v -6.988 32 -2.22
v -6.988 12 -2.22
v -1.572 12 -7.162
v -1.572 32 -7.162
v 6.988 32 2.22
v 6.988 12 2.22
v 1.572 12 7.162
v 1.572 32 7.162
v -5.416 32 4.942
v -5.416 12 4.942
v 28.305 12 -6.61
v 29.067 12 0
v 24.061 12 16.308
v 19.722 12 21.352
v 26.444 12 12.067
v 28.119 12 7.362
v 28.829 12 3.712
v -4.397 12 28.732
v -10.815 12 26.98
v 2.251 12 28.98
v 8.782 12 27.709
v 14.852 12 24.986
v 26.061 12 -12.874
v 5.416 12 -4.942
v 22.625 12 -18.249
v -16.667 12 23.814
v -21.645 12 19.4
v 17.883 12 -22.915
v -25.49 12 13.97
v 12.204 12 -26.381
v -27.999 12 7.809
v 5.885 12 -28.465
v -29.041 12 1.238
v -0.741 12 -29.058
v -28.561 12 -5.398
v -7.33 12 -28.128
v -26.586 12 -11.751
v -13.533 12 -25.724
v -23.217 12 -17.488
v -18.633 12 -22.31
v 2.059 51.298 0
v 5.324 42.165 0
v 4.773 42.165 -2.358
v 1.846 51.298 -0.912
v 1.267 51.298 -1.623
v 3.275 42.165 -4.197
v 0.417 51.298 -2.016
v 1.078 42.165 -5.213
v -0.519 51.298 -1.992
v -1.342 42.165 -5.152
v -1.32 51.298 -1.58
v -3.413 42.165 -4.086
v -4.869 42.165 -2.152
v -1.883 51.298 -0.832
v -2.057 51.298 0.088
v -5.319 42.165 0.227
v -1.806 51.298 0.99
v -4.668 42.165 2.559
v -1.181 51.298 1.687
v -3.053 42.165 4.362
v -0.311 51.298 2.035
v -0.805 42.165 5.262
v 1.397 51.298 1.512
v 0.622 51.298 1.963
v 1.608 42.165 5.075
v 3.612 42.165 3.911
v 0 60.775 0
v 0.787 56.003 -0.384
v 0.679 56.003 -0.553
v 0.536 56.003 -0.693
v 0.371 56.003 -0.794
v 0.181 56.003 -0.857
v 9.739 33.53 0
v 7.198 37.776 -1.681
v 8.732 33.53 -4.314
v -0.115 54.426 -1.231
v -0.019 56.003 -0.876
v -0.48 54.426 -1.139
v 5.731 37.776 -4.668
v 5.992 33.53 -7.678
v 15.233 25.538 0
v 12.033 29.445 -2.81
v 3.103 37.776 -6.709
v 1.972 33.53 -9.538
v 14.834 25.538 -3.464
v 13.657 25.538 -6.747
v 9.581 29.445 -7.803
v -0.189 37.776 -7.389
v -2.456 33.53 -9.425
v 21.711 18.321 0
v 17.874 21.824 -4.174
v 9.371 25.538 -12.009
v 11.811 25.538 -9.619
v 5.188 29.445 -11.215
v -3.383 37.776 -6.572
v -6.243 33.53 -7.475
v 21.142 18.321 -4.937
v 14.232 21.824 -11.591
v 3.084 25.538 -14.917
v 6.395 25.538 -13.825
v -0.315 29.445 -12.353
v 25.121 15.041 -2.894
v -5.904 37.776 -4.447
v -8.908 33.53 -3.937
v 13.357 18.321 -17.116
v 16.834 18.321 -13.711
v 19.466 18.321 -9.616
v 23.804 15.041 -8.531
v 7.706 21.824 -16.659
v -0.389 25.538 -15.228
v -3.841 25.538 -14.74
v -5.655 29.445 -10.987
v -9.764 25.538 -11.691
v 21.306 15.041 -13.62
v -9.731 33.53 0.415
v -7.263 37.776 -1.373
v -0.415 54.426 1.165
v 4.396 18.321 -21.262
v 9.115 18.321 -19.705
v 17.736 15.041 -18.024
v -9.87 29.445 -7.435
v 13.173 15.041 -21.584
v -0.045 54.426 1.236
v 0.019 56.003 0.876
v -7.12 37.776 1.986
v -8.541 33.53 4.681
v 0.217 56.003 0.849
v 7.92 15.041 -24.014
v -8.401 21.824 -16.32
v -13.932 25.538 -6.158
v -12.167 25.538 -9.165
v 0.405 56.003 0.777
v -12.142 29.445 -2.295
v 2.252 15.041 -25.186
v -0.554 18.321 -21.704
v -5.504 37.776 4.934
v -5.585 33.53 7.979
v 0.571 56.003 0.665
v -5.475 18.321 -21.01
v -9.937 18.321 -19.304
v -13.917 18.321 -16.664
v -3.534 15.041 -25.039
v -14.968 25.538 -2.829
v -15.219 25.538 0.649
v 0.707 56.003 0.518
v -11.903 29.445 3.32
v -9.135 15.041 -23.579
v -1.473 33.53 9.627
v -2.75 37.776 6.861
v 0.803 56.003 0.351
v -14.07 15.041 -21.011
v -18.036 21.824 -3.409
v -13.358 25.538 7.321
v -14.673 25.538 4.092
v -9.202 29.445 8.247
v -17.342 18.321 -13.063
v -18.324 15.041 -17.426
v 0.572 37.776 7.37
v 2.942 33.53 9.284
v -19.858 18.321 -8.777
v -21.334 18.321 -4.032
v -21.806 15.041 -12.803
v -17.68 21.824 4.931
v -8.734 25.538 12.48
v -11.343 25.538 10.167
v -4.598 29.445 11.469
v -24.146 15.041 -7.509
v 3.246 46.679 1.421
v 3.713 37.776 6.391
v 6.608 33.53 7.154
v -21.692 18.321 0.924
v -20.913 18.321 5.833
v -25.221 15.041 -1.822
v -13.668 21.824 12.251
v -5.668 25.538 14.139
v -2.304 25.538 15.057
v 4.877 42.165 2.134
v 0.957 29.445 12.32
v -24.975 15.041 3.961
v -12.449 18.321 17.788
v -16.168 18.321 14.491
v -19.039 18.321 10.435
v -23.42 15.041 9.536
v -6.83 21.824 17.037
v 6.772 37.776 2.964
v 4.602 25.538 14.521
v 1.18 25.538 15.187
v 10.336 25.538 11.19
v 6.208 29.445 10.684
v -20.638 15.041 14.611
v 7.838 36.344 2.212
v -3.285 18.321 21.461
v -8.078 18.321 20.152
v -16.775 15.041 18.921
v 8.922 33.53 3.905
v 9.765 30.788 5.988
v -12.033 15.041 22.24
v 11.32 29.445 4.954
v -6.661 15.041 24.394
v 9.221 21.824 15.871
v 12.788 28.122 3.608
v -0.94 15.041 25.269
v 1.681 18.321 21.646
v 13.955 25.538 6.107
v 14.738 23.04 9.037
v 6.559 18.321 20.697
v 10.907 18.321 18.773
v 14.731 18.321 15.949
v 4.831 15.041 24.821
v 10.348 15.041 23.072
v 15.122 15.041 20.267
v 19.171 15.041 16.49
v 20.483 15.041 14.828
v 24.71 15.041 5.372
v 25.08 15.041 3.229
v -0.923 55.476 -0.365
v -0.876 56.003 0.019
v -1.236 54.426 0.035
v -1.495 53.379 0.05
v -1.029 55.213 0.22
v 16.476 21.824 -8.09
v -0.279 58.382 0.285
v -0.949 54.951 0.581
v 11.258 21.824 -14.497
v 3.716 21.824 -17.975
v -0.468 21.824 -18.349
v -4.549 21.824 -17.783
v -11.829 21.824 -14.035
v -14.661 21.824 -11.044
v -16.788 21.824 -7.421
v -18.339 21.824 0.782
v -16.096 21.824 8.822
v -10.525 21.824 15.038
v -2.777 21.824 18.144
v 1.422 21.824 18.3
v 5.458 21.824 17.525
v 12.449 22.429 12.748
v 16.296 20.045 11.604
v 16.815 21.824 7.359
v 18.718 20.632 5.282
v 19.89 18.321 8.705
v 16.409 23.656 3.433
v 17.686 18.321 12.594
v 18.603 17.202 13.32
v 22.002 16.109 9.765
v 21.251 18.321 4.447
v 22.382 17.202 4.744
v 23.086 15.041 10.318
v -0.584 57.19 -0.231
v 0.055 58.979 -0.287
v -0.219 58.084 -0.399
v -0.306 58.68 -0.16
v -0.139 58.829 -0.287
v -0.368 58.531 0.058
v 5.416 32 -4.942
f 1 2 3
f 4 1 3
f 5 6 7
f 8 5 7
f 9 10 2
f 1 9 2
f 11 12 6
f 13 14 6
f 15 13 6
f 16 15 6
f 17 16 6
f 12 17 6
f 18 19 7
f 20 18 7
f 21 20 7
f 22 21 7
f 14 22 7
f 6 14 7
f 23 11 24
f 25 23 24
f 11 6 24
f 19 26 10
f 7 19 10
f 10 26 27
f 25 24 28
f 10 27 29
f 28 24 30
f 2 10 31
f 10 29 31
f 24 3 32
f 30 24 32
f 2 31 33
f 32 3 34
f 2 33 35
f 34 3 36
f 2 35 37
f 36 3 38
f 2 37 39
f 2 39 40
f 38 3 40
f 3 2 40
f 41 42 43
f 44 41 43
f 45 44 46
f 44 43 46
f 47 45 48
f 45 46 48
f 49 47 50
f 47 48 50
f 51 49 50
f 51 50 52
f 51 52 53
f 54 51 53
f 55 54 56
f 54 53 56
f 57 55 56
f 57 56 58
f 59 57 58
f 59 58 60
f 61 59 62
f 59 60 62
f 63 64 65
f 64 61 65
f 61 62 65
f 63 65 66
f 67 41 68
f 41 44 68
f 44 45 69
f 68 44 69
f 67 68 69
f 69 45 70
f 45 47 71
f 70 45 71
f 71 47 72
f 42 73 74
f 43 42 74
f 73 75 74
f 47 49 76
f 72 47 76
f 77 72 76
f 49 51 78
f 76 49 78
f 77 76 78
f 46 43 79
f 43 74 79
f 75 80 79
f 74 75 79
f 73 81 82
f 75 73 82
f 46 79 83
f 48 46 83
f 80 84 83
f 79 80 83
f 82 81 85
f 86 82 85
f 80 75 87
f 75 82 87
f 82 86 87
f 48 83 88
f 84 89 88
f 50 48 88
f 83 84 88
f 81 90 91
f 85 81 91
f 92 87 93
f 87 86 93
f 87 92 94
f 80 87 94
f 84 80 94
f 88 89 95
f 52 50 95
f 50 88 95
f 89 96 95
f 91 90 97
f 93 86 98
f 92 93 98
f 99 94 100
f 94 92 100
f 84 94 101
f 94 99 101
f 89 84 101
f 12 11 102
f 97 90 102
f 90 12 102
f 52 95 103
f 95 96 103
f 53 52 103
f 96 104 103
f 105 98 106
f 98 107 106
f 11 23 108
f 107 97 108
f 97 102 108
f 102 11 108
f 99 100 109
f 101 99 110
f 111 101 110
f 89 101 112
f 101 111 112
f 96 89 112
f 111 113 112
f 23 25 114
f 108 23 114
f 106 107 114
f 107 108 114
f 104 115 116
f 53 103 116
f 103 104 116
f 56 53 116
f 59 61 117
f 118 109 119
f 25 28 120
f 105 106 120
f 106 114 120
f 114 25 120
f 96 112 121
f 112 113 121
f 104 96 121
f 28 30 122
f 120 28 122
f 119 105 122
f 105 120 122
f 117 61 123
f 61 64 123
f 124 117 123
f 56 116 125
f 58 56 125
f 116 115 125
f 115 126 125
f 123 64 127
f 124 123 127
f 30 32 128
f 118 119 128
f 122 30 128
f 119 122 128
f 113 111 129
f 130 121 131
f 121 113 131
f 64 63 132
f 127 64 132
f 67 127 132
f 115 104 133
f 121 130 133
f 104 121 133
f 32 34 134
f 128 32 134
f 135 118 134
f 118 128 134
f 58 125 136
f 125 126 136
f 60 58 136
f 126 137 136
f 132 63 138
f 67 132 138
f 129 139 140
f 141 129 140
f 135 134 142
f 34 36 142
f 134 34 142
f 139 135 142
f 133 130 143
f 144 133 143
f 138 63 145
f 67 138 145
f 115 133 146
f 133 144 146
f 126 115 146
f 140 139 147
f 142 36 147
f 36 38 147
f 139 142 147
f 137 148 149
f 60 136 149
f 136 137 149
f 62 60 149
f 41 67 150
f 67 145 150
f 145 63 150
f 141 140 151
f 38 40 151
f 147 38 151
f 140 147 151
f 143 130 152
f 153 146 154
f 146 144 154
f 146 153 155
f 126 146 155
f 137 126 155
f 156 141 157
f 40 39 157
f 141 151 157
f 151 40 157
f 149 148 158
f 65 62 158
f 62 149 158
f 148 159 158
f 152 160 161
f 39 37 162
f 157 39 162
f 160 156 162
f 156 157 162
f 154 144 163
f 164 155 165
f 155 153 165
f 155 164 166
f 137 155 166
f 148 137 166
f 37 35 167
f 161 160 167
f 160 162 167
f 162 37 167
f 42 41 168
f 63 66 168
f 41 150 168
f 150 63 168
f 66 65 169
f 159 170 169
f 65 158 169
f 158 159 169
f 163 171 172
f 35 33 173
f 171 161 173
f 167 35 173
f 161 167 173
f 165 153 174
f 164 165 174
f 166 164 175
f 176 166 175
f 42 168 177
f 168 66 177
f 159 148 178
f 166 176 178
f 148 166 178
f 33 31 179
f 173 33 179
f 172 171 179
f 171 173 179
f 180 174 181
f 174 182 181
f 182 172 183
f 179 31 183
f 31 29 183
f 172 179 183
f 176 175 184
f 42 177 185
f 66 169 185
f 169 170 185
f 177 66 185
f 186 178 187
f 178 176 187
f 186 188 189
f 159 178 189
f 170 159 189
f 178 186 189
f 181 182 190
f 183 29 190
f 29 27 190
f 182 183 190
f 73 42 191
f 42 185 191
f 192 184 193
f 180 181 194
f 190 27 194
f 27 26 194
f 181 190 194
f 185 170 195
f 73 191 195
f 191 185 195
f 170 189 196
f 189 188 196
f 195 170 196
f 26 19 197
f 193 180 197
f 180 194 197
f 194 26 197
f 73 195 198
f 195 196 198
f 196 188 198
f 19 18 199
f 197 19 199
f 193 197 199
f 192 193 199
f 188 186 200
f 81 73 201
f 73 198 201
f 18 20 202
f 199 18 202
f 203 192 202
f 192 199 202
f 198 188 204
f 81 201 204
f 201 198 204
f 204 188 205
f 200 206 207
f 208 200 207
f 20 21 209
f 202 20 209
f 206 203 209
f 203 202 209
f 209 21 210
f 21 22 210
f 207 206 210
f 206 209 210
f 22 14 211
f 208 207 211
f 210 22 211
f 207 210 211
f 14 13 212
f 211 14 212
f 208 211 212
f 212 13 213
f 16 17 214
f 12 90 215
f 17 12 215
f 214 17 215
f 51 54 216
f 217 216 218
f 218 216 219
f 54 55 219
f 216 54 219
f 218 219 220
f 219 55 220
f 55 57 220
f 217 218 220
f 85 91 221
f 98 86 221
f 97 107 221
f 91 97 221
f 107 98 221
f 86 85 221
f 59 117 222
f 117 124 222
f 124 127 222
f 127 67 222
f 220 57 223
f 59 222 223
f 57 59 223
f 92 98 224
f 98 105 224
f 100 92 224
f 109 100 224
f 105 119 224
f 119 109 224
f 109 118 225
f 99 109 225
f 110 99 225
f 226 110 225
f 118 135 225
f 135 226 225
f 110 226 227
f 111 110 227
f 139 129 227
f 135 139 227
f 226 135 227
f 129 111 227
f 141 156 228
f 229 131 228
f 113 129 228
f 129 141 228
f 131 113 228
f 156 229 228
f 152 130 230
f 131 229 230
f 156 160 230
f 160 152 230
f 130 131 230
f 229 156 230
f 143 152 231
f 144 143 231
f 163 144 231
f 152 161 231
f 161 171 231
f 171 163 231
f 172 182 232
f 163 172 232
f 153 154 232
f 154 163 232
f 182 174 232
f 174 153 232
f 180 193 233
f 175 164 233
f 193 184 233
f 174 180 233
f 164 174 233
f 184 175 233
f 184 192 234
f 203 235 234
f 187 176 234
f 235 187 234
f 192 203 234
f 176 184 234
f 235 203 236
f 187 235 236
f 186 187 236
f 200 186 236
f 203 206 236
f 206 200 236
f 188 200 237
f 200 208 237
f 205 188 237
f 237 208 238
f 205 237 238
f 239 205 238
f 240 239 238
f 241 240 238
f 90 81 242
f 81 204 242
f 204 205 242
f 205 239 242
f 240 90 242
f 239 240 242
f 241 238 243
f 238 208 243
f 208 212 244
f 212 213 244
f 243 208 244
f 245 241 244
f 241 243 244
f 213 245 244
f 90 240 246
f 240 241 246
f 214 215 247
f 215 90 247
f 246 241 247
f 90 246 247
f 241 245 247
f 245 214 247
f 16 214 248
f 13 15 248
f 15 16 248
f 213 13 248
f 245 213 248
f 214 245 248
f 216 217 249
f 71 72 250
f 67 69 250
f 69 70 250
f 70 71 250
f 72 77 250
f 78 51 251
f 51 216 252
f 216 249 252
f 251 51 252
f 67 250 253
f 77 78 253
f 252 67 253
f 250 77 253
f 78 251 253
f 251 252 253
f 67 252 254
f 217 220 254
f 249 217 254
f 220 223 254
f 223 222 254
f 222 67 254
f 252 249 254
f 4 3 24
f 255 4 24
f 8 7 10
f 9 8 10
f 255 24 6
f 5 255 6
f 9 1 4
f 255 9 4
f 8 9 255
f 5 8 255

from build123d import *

# Parameters (mm, degrees)
SKETCH4_W               = 141.009584828
SKETCH4_H               = 12
CUT_EXTRUDE1_DEPTH      = 53.911904977
CUT_EXTRUDE1_DEPTH_BACK = 53.911904977
CUT_EXTRUDE2_DEPTH      = 20


with BuildPart() as part:
    # Sketch3 → Revolve2 (revolve)
    with BuildSketch(Plane.XY):
        with BuildLine():
            Line((0, 0), (0, 60.774821803))
            ThreePointArc((0, 60.774821803), (17.600685917, 22.677819891), (52.911904877, 0))
            Line((52.911904877, 0), (0, 0))
        make_face()
    revolve(axis=Axis((0, 0, 0), (0, 1, 0)))

    # Sketch4 → Cut-Extrude1 (cut, two sides)
    with BuildSketch(Plane(origin=(0, 0, 0), x_dir=(0, 0, -1), z_dir=(1, 0, 0))) as cut_extrude1_sk:
        with Locations((0, 6)):
            Rectangle(SKETCH4_W, SKETCH4_H)
    extrude(amount=CUT_EXTRUDE1_DEPTH, mode=Mode.SUBTRACT)
    extrude(cut_extrude1_sk.sketch, amount=-CUT_EXTRUDE1_DEPTH_BACK, mode=Mode.SUBTRACT)

    # Sketch5 → Cut-Extrude2 (cut)
    with BuildSketch(Plane.XZ.offset(-12)):
        Polygon((-5.41643054, 4.942227588), (-6.988309913, -2.219652652), (-1.571879373, -7.16188024), (5.41643054, -4.942227588), (6.988309913, 2.219652652), (1.571879373, 7.16188024), align=None)
    extrude(amount=-CUT_EXTRUDE2_DEPTH, mode=Mode.SUBTRACT)


solid = part.part
